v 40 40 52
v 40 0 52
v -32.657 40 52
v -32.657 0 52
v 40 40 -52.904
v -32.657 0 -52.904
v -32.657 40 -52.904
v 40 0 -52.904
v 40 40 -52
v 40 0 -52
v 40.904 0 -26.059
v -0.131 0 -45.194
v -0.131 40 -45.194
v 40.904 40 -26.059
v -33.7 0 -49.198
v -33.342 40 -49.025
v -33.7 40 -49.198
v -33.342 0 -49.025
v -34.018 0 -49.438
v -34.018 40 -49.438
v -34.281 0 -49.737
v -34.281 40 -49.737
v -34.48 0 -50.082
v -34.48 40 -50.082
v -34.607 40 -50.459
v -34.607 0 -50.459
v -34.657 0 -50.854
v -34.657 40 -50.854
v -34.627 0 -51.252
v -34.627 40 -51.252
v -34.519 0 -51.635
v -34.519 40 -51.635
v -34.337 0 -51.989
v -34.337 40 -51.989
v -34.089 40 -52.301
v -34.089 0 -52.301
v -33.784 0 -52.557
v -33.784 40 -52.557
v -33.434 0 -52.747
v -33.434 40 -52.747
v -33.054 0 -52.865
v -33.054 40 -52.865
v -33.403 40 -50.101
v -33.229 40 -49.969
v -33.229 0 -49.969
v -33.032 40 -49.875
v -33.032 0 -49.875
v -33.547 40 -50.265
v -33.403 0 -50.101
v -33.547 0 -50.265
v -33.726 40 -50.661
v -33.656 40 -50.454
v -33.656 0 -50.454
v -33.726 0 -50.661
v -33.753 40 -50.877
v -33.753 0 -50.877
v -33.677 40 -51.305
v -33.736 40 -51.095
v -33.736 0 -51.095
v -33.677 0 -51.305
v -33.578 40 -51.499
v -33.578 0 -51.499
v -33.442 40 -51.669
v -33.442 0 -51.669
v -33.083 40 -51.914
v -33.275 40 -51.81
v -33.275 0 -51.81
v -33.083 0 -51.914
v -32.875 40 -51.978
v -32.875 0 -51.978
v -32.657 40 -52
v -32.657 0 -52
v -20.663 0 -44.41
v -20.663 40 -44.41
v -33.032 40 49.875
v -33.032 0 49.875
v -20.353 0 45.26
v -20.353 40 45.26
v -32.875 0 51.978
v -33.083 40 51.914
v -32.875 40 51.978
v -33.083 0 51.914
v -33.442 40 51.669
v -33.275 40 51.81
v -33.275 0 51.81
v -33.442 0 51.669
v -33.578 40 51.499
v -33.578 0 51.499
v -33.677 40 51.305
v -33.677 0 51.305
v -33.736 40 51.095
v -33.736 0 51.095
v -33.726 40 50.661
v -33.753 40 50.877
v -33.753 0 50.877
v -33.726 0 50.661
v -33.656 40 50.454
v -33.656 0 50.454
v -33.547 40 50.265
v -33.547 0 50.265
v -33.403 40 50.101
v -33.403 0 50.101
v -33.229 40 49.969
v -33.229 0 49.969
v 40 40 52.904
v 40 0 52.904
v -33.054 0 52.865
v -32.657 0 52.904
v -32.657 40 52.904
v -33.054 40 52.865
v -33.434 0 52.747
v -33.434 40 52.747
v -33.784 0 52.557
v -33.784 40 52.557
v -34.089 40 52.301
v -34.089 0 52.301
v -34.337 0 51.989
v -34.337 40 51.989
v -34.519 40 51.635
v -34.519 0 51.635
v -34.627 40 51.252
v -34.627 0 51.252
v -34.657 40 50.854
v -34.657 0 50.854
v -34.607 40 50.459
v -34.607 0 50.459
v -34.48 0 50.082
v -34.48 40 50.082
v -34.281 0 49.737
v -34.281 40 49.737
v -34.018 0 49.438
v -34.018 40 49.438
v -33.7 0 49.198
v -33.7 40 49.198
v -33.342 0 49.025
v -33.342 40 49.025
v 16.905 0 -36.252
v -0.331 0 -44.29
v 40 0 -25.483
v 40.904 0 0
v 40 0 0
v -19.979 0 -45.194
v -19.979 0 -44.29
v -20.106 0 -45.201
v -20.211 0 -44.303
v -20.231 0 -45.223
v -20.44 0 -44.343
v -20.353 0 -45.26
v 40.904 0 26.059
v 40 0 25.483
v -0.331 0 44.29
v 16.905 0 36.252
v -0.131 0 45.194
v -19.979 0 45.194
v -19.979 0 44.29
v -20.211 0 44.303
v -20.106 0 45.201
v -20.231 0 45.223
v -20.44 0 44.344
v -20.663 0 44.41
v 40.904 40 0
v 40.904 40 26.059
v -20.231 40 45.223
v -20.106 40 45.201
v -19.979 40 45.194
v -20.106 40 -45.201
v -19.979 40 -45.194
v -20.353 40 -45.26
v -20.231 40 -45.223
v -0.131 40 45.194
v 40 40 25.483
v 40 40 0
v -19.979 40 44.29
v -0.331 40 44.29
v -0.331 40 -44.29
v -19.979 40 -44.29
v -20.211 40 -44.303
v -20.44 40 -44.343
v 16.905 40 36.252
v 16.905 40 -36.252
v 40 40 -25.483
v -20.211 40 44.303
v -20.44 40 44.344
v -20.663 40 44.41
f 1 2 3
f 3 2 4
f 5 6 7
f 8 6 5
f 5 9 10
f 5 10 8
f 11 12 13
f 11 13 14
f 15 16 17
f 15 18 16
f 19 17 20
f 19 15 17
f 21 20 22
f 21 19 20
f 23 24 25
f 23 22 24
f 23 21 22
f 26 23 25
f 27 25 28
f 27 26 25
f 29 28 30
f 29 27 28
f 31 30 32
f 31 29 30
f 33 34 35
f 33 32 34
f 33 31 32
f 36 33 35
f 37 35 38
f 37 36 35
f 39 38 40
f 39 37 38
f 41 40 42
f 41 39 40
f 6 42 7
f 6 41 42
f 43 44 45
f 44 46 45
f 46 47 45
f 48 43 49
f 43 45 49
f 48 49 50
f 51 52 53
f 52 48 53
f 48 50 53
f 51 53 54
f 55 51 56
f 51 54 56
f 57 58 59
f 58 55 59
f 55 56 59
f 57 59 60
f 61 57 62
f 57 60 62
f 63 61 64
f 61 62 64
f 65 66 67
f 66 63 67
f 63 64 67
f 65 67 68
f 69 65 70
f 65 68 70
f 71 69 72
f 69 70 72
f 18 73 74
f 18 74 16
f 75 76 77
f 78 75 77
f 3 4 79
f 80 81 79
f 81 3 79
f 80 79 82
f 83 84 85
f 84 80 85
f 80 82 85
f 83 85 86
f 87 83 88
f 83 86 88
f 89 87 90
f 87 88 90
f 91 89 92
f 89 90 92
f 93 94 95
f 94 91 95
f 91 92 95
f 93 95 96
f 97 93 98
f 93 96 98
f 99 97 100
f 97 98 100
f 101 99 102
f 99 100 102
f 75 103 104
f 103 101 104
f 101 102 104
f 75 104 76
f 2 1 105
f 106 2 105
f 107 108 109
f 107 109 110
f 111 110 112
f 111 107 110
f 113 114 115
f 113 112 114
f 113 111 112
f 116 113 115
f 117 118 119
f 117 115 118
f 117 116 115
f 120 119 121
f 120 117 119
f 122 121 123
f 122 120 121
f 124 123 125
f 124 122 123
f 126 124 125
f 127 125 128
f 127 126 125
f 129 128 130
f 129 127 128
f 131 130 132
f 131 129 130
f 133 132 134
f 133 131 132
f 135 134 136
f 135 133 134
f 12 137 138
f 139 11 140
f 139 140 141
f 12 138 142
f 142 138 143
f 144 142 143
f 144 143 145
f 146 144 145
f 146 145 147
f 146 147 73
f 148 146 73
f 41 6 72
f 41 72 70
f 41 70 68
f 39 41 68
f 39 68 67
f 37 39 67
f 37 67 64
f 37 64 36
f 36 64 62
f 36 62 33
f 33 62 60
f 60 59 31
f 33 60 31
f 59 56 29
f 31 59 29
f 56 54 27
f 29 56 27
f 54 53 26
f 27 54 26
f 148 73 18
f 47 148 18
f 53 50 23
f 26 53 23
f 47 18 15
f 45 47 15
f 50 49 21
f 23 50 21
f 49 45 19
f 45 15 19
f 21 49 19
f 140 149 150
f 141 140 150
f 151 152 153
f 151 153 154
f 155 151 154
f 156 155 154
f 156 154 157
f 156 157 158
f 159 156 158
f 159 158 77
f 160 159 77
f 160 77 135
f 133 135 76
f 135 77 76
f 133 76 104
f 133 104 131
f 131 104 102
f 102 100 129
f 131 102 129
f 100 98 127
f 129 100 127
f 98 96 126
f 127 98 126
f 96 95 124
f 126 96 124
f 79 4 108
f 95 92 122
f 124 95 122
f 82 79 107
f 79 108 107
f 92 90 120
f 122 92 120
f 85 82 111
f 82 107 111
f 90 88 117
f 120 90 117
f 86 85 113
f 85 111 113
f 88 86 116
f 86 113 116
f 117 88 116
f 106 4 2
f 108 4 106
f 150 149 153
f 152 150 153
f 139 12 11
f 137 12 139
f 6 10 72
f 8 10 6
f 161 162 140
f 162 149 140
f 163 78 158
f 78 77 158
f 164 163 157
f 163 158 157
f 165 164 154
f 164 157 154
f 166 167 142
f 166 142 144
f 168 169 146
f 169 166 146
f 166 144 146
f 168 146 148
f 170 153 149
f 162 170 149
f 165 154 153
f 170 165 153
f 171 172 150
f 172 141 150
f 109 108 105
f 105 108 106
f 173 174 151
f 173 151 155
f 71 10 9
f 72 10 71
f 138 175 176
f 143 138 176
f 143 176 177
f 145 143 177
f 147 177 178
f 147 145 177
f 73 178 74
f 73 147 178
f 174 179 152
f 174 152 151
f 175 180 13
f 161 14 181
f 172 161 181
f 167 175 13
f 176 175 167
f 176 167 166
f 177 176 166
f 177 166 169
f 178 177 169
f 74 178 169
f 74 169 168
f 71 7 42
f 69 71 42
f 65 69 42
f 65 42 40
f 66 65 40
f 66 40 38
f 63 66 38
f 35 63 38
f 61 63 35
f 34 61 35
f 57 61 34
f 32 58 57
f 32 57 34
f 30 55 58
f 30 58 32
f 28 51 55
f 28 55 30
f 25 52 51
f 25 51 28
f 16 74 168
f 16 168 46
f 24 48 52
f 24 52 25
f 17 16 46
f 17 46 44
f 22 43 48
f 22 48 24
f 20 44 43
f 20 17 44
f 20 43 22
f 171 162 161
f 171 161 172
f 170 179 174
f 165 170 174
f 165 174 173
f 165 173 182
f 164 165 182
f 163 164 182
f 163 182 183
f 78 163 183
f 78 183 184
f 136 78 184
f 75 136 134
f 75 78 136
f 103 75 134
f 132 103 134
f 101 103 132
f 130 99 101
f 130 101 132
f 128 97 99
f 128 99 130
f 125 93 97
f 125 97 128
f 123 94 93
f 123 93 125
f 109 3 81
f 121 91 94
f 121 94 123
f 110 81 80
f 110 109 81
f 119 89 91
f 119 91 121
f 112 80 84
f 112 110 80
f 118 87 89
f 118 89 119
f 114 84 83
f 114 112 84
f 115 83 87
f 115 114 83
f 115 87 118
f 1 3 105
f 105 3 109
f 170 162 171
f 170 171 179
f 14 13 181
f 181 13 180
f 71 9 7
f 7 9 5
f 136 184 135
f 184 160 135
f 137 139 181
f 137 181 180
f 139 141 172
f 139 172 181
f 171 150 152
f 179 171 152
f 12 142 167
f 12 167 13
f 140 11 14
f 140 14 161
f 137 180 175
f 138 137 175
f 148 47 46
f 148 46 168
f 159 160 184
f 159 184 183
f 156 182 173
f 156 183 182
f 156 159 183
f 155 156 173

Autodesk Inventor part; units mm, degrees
ref_plane "YZ Plane" through (0, 0, 0) normal (1, 0, 0) x (0, 1, 0)
ref_plane "XZ Plane" through (0, 0, 0) normal (0, 1, 0) x (-1, 0, 0)
ref_plane "XY Plane" through (0, 0, 0) normal (0, 0, 1) x (1, 0, 0)
sketch "Esboço1" plane through (0, 0, 0) normal (0, 1, 0) x (-1, 0, 0)
  circle A0 centre (0, 0) radius 40
  line L0 (-40, 0) -> (-40, -25.4828)
  line L1 (-40, -25.4828) -> (0.3313, -44.2896)
  line L2 (0.3313, -44.2896) -> (19.9786, -44.2896)
  line L3 (20.6627, -44.4102) -> (33.3415, -49.0249)
  line L4 (32.6574, -52.9043) -> (-40, -52.9043)
  arc A1 (32.6574, -52.9043) -> (33.3415, -49.0249) centre (32.6574, -50.9043) ccw
  arc A2 (20.6627, -44.4102) -> (19.9786, -44.2896) centre (19.9786, -46.2896) ccw
  line L5 (-40, -52) -> (32.6574, -52)
  arc A3 (32.6574, -52) -> (33.0322, -49.8747) centre (32.6574, -50.9043) ccw
  line L6 (33.0322, -49.8747) -> (20.3534, -45.26)
  arc A4 (20.3534, -45.26) -> (19.9786, -45.1939) centre (19.9786, -46.2896) ccw
  line L7 (19.9786, -45.1939) -> (0.1308, -45.1939)
  line L8 (0.1308, -45.1939) -> (-40.9043, -26.0589)
  line L9 (-40.9043, -26.0589) -> (-40.9043, 0)
  line L10 (-40, -52) -> (-40, -52.9043)
  line L11 (40, 0) -> (-40, 0)
  line L12 (-40, 0) -> (-40, 25.4828)
  line L13 (-40, 25.4828) -> (0.3313, 44.2896)
  line L14 (0.3313, 44.2896) -> (19.9786, 44.2896)
  line L15 (20.6627, 44.4102) -> (33.3415, 49.0249)
  line L16 (32.6574, 52.9043) -> (-40, 52.9043)
  arc A5 (33.3415, 49.0249) -> (32.6574, 52.9043) centre (32.6574, 50.9043) ccw
  arc A6 (19.9786, 44.2896) -> (20.6627, 44.4102) centre (19.9786, 46.2896) ccw
  line L17 (-40, 52) -> (32.6574, 52)
  arc A7 (33.0322, 49.8747) -> (32.6574, 52) centre (32.6574, 50.9043) ccw
  line L18 (33.0322, 49.8747) -> (20.3534, 45.26)
  arc A8 (19.9786, 45.1939) -> (20.3534, 45.26) centre (19.9786, 46.2896) ccw
  line L19 (19.9786, 45.1939) -> (0.1308, 45.1939)
  line L20 (0.1308, 45.1939) -> (-40.9043, 26.0589)
  line L21 (-40.9043, 26.0589) -> (-40.9043, 0)
  line L22 (-40, 52) -> (-40, 52.9043)
  point P0 (20.3313, -44.2896)
  dimension "d0" = 80
  dimension "d1" = 115
  dimension "d4" = 20
  dimension "d5" = 160
  dimension "d6" = 2
  dimension "d7" = 0.9043
  dimension "d8" = 7.7104
  dimension "d9" = 34.6649
  dimension "d10" = 20.6748
extrude "Extrusão1" add sketch "Esboço1" along normal blind 40 contours L13 L12 L0 L1 L2 A2 L3 A1 L4 L10 L5 A3 L6 A4 L7 L8 L9 L21 L20 L19 A8 L18 A7 L17 L22 L16 A5 L15 A6 L14
equation "\"Raio_dobra\" = Espessura"
equation "\"Largura_alívio_de_dobra\" = Espessura"
equation "\"Profundidade_alívio_de_dobra\" = 0.5 * Espessura"
equation "\"Tamanho_alívio_de_dobra\" = 4 * Espessura"
equation "\"Remanescente_mínimo\" = 2 * Espessura"
equation "\"Raiodetransição\" = Raio_dobra"
equation "\"Tamanho_de_raio_de_Jacobi\" = Raio_dobra"
equation "\"TamanhoFolga\" = Espessura"
equation "\"Espessura\" = 0.5"
properties part number "Garra"
